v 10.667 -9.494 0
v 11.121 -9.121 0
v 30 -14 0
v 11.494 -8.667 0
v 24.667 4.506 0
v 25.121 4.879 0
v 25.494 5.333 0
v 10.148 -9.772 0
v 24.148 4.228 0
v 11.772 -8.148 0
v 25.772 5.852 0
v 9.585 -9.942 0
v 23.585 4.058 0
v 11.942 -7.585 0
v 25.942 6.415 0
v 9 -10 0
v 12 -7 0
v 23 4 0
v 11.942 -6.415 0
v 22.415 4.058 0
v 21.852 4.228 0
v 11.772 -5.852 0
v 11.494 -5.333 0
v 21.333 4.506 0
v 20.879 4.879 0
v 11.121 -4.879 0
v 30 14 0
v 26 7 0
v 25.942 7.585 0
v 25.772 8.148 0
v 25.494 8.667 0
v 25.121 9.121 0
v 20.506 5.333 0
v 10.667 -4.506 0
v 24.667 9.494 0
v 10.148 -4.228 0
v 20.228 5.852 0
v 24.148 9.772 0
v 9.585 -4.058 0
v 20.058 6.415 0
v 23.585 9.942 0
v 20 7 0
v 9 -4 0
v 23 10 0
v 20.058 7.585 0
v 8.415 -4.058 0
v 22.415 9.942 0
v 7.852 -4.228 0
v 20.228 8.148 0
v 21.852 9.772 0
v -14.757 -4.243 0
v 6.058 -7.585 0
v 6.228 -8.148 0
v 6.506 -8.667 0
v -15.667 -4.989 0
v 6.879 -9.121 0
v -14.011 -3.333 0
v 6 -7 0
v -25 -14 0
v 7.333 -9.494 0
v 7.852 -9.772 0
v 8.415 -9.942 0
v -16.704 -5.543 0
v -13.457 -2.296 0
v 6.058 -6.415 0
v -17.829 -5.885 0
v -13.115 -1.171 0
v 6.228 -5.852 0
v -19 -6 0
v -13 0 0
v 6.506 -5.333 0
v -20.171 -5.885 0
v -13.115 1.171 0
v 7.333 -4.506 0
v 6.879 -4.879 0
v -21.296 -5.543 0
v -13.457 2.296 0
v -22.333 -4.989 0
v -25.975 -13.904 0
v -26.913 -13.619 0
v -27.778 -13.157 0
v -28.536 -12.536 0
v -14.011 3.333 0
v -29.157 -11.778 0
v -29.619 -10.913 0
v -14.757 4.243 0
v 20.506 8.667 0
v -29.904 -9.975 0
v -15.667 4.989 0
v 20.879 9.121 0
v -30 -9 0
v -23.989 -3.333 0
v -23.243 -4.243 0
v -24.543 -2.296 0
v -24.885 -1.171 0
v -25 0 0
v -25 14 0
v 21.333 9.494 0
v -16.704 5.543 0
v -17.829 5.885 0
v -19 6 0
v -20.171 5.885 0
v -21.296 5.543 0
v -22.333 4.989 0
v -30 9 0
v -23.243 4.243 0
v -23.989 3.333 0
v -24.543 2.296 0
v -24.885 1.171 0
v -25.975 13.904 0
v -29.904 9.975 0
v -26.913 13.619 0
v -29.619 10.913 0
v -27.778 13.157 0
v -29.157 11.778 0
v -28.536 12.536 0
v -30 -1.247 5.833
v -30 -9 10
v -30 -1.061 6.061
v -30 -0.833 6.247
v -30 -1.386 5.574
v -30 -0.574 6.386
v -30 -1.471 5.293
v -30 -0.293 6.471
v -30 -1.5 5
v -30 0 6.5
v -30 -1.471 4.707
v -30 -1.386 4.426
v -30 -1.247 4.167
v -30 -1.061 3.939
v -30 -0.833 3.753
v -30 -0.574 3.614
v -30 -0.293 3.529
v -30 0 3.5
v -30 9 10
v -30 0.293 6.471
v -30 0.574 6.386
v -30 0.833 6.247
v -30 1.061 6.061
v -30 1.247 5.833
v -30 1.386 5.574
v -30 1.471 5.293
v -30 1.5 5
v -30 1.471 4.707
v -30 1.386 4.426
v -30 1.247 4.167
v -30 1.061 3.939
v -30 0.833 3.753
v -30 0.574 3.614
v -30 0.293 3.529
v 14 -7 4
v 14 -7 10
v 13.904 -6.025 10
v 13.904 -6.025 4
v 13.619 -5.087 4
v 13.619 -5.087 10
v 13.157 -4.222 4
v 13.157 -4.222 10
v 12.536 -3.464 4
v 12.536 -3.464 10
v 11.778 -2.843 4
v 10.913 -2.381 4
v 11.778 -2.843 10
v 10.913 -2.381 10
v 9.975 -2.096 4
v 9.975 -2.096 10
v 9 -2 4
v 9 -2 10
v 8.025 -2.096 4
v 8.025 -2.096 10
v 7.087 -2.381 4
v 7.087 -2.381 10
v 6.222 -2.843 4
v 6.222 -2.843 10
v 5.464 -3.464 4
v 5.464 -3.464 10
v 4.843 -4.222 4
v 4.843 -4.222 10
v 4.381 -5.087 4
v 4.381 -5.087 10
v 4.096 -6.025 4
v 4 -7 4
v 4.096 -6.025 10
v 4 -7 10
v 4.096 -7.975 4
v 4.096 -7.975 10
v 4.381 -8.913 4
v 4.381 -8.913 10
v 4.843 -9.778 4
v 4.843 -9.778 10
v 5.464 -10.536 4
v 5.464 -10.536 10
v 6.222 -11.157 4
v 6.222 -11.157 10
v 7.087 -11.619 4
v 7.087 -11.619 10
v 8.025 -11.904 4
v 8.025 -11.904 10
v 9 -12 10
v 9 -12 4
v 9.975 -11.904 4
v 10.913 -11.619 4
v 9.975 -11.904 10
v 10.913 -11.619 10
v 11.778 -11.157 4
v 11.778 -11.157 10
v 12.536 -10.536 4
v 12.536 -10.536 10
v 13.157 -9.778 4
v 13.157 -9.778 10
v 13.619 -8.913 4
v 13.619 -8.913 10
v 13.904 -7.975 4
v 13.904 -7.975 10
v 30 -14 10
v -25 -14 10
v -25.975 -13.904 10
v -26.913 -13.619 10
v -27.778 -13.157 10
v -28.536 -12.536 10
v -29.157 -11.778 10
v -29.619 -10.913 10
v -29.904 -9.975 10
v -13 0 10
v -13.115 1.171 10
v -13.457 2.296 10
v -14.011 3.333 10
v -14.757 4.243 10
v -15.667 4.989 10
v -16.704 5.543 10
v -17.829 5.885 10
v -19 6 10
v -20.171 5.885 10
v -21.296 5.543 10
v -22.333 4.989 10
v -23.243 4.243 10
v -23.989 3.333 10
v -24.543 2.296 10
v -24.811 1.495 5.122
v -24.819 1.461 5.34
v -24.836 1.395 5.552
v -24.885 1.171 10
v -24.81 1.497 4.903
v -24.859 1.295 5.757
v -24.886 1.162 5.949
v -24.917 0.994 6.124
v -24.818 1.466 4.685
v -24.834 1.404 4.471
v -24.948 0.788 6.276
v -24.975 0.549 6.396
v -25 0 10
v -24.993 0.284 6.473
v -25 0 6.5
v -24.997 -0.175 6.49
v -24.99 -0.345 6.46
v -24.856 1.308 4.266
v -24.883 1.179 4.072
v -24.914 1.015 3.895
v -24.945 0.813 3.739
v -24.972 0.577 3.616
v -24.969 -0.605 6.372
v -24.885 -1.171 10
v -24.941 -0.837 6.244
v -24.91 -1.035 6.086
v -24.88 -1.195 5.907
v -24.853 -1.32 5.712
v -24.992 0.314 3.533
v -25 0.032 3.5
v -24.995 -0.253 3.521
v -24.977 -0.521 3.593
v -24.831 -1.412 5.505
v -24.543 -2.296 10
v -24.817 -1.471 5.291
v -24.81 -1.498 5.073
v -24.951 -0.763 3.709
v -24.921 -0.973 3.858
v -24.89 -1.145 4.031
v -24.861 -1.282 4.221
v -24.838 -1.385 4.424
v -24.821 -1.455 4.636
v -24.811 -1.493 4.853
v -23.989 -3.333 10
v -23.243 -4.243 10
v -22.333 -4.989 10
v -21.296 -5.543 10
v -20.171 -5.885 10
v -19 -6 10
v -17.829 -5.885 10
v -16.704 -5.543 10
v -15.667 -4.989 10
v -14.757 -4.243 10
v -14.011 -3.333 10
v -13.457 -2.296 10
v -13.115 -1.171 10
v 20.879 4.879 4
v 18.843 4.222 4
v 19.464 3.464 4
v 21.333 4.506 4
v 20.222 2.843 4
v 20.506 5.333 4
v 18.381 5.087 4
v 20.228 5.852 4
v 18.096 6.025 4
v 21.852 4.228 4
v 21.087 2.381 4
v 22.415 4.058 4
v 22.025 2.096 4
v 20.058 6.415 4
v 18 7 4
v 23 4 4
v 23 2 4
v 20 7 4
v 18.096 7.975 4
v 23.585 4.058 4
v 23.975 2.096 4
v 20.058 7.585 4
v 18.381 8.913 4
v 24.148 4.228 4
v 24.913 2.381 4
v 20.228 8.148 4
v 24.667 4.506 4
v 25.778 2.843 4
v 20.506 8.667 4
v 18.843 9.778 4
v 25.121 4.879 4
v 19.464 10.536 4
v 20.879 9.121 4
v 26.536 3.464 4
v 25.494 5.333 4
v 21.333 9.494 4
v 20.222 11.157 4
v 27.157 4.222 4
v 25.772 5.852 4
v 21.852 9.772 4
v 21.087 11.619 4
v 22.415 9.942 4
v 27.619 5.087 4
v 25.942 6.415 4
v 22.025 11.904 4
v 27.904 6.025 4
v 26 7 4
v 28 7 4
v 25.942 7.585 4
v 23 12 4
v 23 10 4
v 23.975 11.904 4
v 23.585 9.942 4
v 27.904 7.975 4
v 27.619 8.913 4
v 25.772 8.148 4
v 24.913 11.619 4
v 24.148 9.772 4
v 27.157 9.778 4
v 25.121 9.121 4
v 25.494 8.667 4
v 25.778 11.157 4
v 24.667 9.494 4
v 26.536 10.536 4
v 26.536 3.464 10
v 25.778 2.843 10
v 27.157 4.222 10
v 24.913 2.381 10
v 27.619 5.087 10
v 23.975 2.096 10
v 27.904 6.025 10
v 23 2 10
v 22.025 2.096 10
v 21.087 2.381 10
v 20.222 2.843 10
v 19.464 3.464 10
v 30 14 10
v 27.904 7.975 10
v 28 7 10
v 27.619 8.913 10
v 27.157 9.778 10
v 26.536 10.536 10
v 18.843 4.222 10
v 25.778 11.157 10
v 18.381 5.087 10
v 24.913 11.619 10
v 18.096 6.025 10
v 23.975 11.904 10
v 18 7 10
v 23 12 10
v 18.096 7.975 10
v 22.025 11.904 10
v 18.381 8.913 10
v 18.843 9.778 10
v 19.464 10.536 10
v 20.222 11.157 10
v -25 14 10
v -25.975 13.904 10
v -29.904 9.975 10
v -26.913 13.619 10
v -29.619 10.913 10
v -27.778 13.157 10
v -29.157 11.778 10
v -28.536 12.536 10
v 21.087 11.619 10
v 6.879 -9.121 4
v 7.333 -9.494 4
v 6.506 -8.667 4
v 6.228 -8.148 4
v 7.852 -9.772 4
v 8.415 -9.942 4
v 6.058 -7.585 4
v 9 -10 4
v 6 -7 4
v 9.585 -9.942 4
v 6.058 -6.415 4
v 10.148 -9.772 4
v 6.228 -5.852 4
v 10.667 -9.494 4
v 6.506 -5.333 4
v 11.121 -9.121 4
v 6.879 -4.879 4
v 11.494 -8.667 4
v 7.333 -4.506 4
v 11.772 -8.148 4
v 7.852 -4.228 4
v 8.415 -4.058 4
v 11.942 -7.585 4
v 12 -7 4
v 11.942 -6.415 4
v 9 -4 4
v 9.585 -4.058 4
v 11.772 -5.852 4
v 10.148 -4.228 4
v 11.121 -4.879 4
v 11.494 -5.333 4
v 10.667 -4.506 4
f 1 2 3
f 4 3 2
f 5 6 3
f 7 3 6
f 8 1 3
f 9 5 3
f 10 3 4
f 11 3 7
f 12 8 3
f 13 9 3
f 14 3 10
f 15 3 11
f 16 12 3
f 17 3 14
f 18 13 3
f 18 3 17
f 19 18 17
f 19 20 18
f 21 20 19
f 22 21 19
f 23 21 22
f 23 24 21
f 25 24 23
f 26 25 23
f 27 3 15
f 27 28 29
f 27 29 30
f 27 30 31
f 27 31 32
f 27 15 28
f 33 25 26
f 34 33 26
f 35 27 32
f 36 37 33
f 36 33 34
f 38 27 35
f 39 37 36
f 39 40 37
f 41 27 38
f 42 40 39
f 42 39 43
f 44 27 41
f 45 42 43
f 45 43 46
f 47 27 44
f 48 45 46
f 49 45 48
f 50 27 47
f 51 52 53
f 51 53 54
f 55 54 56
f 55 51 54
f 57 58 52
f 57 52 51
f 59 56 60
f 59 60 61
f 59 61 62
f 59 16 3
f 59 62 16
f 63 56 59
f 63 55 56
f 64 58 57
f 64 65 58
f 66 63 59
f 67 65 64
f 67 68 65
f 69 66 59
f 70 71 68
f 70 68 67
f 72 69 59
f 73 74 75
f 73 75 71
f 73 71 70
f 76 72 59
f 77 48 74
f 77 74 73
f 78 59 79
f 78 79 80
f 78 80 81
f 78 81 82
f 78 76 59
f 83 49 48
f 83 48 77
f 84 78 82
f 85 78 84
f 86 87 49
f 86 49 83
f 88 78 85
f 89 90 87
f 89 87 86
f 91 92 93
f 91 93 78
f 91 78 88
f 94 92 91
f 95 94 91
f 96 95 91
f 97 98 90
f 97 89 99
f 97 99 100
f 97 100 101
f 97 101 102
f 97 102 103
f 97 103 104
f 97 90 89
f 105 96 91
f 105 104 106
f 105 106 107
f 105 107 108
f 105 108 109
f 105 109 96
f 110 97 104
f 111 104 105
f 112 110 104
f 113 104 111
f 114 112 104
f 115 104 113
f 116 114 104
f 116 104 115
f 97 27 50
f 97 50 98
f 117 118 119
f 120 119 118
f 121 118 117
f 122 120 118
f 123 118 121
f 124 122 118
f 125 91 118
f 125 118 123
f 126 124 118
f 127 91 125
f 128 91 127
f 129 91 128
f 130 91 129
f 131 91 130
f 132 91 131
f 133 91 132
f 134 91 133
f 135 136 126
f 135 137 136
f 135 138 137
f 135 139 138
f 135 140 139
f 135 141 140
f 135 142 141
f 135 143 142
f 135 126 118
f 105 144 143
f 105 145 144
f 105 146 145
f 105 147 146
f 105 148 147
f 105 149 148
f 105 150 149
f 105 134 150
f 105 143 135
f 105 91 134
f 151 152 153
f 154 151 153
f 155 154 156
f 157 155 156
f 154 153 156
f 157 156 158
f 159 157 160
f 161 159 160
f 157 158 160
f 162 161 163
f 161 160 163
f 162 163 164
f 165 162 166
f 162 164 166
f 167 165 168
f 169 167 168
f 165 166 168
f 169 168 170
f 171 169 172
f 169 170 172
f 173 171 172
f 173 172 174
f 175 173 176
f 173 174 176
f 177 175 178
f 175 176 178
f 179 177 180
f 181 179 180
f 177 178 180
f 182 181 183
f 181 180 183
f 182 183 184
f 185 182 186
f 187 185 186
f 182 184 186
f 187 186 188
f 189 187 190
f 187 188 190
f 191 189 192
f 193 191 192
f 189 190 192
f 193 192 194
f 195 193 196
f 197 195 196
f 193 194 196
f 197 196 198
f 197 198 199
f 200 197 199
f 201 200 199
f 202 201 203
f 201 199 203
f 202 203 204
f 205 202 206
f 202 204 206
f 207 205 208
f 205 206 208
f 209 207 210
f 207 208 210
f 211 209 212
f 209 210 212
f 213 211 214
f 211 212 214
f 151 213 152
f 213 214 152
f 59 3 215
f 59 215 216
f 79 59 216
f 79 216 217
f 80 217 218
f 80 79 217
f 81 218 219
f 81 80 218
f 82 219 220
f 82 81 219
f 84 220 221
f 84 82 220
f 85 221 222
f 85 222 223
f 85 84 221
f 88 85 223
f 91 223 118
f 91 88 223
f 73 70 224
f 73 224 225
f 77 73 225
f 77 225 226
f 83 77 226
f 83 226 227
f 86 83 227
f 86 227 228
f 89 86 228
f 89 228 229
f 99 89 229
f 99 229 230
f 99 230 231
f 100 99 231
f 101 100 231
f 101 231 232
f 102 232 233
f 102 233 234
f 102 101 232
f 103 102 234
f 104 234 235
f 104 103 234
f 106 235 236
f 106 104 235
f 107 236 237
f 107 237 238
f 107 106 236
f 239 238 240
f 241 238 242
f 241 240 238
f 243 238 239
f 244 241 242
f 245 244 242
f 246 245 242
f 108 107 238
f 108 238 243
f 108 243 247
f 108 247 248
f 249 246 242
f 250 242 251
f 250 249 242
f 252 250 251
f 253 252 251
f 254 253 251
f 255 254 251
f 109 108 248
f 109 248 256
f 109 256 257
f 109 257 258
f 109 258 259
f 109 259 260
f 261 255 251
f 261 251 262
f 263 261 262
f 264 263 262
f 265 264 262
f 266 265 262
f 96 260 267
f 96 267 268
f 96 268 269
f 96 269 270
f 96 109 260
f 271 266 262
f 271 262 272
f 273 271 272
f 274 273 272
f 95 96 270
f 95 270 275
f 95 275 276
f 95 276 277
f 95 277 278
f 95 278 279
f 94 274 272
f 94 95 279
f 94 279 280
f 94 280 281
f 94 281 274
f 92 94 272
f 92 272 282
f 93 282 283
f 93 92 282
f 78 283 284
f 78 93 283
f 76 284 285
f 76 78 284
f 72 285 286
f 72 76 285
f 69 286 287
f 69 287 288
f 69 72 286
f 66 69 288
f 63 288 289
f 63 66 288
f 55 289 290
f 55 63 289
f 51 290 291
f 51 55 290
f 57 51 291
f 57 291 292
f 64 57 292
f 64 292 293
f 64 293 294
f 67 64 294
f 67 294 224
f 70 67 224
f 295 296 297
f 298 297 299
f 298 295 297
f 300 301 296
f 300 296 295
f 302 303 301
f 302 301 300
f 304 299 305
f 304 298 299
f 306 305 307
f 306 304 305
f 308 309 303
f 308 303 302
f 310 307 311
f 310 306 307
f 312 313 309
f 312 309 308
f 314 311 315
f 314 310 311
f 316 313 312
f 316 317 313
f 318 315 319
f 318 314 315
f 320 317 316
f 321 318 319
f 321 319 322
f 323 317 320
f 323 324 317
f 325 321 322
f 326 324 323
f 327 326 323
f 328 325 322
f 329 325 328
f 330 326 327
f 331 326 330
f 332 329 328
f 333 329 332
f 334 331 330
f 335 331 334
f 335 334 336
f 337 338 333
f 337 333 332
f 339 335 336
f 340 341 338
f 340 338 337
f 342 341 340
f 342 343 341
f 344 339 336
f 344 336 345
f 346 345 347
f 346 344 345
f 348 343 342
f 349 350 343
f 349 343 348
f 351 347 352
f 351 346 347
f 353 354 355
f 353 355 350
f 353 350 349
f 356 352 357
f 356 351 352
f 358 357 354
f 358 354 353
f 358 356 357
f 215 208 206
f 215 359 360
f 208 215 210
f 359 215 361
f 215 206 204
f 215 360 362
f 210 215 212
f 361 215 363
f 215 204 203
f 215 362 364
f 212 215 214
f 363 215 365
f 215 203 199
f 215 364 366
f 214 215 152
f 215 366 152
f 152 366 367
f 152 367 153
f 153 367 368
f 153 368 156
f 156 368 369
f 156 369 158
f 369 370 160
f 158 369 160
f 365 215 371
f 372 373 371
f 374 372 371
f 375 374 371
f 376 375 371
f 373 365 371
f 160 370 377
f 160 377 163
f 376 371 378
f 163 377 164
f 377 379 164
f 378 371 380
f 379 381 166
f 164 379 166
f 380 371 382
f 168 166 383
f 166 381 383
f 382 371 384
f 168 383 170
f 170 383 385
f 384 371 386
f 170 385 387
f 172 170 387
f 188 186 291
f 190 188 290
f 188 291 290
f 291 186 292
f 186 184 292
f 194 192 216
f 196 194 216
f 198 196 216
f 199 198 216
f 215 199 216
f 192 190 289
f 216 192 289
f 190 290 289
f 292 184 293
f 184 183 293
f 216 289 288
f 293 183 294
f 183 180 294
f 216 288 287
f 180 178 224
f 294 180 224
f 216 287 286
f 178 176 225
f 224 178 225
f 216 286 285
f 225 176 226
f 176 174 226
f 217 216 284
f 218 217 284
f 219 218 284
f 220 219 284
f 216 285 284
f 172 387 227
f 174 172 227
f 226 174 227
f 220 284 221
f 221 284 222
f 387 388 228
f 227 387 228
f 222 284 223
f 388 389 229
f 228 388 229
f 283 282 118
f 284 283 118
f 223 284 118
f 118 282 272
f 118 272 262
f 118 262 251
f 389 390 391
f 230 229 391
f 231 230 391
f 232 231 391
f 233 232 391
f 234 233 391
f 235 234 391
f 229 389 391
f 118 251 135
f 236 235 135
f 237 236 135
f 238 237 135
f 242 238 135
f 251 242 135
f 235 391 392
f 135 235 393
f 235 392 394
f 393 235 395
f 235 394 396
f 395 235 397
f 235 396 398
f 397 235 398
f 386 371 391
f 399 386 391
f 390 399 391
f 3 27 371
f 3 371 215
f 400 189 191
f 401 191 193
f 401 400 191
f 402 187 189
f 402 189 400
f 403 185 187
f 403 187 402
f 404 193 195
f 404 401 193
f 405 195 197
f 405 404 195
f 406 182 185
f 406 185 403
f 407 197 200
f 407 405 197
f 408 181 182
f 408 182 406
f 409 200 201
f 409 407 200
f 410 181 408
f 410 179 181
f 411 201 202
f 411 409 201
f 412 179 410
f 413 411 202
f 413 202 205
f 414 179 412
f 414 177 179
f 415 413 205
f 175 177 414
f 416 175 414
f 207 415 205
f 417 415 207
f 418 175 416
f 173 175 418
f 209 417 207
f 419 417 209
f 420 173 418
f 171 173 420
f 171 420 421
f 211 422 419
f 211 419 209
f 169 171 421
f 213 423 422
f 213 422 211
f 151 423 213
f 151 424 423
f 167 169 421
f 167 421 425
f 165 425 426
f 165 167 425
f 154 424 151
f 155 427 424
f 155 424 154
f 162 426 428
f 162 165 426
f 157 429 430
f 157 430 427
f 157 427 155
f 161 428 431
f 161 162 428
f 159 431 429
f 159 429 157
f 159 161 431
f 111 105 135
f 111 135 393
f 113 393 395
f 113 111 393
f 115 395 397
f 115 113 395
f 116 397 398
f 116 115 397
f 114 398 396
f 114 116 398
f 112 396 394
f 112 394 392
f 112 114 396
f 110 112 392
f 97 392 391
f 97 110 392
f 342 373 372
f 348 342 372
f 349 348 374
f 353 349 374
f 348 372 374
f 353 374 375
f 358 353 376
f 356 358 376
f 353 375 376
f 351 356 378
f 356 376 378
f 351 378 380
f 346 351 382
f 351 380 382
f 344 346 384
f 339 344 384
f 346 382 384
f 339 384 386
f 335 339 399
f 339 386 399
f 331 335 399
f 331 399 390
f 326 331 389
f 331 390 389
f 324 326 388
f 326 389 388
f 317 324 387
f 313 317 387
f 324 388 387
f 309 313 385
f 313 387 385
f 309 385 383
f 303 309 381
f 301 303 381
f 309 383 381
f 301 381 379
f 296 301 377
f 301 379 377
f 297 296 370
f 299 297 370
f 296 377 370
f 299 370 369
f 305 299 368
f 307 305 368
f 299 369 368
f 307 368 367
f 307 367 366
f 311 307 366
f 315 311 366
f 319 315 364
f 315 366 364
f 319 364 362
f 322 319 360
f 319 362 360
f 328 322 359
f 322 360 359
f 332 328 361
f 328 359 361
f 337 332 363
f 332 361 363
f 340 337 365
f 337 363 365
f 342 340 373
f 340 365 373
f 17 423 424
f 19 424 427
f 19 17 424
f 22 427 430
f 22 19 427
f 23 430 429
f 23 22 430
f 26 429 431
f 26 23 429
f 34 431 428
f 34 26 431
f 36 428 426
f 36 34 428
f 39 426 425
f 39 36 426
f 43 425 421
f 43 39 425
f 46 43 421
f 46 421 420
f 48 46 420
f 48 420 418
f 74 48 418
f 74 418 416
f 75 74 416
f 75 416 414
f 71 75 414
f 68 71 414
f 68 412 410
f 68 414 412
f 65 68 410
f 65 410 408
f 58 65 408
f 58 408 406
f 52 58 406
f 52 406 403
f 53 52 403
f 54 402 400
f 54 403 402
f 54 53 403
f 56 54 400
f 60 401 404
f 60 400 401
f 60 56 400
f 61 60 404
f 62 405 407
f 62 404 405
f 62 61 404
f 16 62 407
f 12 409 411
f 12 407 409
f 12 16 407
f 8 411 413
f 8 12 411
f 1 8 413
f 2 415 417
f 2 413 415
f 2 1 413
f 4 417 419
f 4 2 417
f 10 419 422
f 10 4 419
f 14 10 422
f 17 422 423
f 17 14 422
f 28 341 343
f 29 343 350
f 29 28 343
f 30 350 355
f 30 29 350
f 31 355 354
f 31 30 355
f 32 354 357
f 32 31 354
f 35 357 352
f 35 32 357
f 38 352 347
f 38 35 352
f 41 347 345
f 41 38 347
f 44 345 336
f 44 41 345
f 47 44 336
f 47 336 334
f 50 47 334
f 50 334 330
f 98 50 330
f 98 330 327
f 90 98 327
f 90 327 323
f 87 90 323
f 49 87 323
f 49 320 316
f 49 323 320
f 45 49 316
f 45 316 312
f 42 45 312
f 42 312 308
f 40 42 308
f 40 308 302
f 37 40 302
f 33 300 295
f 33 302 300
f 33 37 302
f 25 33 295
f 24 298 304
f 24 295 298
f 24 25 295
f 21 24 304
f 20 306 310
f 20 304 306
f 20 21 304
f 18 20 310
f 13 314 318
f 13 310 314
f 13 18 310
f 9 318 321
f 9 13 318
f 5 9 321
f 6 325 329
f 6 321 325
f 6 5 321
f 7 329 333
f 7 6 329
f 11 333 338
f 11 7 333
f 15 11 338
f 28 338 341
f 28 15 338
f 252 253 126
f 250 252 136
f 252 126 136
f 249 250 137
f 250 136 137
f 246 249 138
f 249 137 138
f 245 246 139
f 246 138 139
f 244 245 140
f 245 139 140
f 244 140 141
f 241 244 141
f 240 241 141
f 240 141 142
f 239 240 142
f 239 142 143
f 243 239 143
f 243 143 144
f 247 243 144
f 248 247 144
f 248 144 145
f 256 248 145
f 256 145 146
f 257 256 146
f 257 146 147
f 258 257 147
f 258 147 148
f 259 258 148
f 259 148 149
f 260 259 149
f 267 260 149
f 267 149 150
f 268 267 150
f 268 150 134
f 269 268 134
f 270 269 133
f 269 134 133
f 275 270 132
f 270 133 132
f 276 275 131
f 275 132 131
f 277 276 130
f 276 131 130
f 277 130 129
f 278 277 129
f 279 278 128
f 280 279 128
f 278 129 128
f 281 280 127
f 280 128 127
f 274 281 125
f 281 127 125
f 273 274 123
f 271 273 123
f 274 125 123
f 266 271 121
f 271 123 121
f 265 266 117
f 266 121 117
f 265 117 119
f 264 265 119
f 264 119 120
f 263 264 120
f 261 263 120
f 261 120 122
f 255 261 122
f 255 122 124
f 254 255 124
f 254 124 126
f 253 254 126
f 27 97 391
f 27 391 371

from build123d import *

# Parameters (mm, degrees)
IZIM1_R                     = 3
IZIM1_R_2                   = 6
Y_KSEKLIK_EKSTR_ZYON1_DEPTH = 10
KES_EKSTR_ZYON1_REACH       = 64.418
KES_EKSTR_ZYON1_END_RADIUS  = 6
IZIM2_R                     = 1.5
SKETCH1_R                   = 5
CUT_EXTRUDE1_DEPTH          = 6


with BuildPart() as part:
    # Çizim1 → Yükseklik-Ekstrüzyon1 (new body)
    with BuildSketch(Plane.XY):
        with BuildLine():
            Line((30, -14), (-25, -14))
            ThreePointArc((-25, -14), (-28.535533906, -12.535533906), (-30, -9))
            Line((-30, -9), (-30, 9))
            ThreePointArc((-30, 9), (-28.535533906, 12.535533906), (-25, 14))
            Line((-25, 14), (30, 14))
            Line((30, 14), (30, -14))
        make_face()
        with Locations((23, 7)):
            Circle(IZIM1_R, mode=Mode.SUBTRACT)
        with Locations((-19, 0)):
            Circle(IZIM1_R_2, mode=Mode.SUBTRACT)
        with Locations((9, -7)):
            Circle(IZIM1_R, mode=Mode.SUBTRACT)
    extrude(amount=Y_KSEKLIK_EKSTR_ZYON1_DEPTH)

    # Kes-Ekstrüzyon1: up to this cylinder (the profile starts outside it)
    kes_ekstr_zyon1_end = Plane(origin=(-19, 0, 5), z_dir=(0, 0, -1)) * Cylinder(KES_EKSTR_ZYON1_END_RADIUS, 141.836, mode=Mode.PRIVATE)
    # Çizim2 → Kes-Ekstrüzyon1 (cut, up to the surface)
    with BuildSketch(Plane.ZY.offset(30), mode=Mode.PRIVATE) as kes_ekstr_zyon1_sk1:
        with Locations((5, 0)):
            Circle(IZIM2_R)
    kes_ekstr_zyon1_tool1 = extrude(kes_ekstr_zyon1_sk1.sketch, amount=-KES_EKSTR_ZYON1_REACH, mode=Mode.PRIVATE) - kes_ekstr_zyon1_end
    add(kes_ekstr_zyon1_tool1.solids().sort_by_distance((-30, 0, 5))[0], mode=Mode.SUBTRACT)

    # Sketch1 → Cut-Extrude1 (cut)
    with BuildSketch(Plane.XY.offset(10)):
        with Locations((9, -7)):
            Circle(SKETCH1_R)
        with Locations((23, 7)):
            Circle(SKETCH1_R)
    extrude(amount=-CUT_EXTRUDE1_DEPTH, mode=Mode.SUBTRACT)


solid = part.part
